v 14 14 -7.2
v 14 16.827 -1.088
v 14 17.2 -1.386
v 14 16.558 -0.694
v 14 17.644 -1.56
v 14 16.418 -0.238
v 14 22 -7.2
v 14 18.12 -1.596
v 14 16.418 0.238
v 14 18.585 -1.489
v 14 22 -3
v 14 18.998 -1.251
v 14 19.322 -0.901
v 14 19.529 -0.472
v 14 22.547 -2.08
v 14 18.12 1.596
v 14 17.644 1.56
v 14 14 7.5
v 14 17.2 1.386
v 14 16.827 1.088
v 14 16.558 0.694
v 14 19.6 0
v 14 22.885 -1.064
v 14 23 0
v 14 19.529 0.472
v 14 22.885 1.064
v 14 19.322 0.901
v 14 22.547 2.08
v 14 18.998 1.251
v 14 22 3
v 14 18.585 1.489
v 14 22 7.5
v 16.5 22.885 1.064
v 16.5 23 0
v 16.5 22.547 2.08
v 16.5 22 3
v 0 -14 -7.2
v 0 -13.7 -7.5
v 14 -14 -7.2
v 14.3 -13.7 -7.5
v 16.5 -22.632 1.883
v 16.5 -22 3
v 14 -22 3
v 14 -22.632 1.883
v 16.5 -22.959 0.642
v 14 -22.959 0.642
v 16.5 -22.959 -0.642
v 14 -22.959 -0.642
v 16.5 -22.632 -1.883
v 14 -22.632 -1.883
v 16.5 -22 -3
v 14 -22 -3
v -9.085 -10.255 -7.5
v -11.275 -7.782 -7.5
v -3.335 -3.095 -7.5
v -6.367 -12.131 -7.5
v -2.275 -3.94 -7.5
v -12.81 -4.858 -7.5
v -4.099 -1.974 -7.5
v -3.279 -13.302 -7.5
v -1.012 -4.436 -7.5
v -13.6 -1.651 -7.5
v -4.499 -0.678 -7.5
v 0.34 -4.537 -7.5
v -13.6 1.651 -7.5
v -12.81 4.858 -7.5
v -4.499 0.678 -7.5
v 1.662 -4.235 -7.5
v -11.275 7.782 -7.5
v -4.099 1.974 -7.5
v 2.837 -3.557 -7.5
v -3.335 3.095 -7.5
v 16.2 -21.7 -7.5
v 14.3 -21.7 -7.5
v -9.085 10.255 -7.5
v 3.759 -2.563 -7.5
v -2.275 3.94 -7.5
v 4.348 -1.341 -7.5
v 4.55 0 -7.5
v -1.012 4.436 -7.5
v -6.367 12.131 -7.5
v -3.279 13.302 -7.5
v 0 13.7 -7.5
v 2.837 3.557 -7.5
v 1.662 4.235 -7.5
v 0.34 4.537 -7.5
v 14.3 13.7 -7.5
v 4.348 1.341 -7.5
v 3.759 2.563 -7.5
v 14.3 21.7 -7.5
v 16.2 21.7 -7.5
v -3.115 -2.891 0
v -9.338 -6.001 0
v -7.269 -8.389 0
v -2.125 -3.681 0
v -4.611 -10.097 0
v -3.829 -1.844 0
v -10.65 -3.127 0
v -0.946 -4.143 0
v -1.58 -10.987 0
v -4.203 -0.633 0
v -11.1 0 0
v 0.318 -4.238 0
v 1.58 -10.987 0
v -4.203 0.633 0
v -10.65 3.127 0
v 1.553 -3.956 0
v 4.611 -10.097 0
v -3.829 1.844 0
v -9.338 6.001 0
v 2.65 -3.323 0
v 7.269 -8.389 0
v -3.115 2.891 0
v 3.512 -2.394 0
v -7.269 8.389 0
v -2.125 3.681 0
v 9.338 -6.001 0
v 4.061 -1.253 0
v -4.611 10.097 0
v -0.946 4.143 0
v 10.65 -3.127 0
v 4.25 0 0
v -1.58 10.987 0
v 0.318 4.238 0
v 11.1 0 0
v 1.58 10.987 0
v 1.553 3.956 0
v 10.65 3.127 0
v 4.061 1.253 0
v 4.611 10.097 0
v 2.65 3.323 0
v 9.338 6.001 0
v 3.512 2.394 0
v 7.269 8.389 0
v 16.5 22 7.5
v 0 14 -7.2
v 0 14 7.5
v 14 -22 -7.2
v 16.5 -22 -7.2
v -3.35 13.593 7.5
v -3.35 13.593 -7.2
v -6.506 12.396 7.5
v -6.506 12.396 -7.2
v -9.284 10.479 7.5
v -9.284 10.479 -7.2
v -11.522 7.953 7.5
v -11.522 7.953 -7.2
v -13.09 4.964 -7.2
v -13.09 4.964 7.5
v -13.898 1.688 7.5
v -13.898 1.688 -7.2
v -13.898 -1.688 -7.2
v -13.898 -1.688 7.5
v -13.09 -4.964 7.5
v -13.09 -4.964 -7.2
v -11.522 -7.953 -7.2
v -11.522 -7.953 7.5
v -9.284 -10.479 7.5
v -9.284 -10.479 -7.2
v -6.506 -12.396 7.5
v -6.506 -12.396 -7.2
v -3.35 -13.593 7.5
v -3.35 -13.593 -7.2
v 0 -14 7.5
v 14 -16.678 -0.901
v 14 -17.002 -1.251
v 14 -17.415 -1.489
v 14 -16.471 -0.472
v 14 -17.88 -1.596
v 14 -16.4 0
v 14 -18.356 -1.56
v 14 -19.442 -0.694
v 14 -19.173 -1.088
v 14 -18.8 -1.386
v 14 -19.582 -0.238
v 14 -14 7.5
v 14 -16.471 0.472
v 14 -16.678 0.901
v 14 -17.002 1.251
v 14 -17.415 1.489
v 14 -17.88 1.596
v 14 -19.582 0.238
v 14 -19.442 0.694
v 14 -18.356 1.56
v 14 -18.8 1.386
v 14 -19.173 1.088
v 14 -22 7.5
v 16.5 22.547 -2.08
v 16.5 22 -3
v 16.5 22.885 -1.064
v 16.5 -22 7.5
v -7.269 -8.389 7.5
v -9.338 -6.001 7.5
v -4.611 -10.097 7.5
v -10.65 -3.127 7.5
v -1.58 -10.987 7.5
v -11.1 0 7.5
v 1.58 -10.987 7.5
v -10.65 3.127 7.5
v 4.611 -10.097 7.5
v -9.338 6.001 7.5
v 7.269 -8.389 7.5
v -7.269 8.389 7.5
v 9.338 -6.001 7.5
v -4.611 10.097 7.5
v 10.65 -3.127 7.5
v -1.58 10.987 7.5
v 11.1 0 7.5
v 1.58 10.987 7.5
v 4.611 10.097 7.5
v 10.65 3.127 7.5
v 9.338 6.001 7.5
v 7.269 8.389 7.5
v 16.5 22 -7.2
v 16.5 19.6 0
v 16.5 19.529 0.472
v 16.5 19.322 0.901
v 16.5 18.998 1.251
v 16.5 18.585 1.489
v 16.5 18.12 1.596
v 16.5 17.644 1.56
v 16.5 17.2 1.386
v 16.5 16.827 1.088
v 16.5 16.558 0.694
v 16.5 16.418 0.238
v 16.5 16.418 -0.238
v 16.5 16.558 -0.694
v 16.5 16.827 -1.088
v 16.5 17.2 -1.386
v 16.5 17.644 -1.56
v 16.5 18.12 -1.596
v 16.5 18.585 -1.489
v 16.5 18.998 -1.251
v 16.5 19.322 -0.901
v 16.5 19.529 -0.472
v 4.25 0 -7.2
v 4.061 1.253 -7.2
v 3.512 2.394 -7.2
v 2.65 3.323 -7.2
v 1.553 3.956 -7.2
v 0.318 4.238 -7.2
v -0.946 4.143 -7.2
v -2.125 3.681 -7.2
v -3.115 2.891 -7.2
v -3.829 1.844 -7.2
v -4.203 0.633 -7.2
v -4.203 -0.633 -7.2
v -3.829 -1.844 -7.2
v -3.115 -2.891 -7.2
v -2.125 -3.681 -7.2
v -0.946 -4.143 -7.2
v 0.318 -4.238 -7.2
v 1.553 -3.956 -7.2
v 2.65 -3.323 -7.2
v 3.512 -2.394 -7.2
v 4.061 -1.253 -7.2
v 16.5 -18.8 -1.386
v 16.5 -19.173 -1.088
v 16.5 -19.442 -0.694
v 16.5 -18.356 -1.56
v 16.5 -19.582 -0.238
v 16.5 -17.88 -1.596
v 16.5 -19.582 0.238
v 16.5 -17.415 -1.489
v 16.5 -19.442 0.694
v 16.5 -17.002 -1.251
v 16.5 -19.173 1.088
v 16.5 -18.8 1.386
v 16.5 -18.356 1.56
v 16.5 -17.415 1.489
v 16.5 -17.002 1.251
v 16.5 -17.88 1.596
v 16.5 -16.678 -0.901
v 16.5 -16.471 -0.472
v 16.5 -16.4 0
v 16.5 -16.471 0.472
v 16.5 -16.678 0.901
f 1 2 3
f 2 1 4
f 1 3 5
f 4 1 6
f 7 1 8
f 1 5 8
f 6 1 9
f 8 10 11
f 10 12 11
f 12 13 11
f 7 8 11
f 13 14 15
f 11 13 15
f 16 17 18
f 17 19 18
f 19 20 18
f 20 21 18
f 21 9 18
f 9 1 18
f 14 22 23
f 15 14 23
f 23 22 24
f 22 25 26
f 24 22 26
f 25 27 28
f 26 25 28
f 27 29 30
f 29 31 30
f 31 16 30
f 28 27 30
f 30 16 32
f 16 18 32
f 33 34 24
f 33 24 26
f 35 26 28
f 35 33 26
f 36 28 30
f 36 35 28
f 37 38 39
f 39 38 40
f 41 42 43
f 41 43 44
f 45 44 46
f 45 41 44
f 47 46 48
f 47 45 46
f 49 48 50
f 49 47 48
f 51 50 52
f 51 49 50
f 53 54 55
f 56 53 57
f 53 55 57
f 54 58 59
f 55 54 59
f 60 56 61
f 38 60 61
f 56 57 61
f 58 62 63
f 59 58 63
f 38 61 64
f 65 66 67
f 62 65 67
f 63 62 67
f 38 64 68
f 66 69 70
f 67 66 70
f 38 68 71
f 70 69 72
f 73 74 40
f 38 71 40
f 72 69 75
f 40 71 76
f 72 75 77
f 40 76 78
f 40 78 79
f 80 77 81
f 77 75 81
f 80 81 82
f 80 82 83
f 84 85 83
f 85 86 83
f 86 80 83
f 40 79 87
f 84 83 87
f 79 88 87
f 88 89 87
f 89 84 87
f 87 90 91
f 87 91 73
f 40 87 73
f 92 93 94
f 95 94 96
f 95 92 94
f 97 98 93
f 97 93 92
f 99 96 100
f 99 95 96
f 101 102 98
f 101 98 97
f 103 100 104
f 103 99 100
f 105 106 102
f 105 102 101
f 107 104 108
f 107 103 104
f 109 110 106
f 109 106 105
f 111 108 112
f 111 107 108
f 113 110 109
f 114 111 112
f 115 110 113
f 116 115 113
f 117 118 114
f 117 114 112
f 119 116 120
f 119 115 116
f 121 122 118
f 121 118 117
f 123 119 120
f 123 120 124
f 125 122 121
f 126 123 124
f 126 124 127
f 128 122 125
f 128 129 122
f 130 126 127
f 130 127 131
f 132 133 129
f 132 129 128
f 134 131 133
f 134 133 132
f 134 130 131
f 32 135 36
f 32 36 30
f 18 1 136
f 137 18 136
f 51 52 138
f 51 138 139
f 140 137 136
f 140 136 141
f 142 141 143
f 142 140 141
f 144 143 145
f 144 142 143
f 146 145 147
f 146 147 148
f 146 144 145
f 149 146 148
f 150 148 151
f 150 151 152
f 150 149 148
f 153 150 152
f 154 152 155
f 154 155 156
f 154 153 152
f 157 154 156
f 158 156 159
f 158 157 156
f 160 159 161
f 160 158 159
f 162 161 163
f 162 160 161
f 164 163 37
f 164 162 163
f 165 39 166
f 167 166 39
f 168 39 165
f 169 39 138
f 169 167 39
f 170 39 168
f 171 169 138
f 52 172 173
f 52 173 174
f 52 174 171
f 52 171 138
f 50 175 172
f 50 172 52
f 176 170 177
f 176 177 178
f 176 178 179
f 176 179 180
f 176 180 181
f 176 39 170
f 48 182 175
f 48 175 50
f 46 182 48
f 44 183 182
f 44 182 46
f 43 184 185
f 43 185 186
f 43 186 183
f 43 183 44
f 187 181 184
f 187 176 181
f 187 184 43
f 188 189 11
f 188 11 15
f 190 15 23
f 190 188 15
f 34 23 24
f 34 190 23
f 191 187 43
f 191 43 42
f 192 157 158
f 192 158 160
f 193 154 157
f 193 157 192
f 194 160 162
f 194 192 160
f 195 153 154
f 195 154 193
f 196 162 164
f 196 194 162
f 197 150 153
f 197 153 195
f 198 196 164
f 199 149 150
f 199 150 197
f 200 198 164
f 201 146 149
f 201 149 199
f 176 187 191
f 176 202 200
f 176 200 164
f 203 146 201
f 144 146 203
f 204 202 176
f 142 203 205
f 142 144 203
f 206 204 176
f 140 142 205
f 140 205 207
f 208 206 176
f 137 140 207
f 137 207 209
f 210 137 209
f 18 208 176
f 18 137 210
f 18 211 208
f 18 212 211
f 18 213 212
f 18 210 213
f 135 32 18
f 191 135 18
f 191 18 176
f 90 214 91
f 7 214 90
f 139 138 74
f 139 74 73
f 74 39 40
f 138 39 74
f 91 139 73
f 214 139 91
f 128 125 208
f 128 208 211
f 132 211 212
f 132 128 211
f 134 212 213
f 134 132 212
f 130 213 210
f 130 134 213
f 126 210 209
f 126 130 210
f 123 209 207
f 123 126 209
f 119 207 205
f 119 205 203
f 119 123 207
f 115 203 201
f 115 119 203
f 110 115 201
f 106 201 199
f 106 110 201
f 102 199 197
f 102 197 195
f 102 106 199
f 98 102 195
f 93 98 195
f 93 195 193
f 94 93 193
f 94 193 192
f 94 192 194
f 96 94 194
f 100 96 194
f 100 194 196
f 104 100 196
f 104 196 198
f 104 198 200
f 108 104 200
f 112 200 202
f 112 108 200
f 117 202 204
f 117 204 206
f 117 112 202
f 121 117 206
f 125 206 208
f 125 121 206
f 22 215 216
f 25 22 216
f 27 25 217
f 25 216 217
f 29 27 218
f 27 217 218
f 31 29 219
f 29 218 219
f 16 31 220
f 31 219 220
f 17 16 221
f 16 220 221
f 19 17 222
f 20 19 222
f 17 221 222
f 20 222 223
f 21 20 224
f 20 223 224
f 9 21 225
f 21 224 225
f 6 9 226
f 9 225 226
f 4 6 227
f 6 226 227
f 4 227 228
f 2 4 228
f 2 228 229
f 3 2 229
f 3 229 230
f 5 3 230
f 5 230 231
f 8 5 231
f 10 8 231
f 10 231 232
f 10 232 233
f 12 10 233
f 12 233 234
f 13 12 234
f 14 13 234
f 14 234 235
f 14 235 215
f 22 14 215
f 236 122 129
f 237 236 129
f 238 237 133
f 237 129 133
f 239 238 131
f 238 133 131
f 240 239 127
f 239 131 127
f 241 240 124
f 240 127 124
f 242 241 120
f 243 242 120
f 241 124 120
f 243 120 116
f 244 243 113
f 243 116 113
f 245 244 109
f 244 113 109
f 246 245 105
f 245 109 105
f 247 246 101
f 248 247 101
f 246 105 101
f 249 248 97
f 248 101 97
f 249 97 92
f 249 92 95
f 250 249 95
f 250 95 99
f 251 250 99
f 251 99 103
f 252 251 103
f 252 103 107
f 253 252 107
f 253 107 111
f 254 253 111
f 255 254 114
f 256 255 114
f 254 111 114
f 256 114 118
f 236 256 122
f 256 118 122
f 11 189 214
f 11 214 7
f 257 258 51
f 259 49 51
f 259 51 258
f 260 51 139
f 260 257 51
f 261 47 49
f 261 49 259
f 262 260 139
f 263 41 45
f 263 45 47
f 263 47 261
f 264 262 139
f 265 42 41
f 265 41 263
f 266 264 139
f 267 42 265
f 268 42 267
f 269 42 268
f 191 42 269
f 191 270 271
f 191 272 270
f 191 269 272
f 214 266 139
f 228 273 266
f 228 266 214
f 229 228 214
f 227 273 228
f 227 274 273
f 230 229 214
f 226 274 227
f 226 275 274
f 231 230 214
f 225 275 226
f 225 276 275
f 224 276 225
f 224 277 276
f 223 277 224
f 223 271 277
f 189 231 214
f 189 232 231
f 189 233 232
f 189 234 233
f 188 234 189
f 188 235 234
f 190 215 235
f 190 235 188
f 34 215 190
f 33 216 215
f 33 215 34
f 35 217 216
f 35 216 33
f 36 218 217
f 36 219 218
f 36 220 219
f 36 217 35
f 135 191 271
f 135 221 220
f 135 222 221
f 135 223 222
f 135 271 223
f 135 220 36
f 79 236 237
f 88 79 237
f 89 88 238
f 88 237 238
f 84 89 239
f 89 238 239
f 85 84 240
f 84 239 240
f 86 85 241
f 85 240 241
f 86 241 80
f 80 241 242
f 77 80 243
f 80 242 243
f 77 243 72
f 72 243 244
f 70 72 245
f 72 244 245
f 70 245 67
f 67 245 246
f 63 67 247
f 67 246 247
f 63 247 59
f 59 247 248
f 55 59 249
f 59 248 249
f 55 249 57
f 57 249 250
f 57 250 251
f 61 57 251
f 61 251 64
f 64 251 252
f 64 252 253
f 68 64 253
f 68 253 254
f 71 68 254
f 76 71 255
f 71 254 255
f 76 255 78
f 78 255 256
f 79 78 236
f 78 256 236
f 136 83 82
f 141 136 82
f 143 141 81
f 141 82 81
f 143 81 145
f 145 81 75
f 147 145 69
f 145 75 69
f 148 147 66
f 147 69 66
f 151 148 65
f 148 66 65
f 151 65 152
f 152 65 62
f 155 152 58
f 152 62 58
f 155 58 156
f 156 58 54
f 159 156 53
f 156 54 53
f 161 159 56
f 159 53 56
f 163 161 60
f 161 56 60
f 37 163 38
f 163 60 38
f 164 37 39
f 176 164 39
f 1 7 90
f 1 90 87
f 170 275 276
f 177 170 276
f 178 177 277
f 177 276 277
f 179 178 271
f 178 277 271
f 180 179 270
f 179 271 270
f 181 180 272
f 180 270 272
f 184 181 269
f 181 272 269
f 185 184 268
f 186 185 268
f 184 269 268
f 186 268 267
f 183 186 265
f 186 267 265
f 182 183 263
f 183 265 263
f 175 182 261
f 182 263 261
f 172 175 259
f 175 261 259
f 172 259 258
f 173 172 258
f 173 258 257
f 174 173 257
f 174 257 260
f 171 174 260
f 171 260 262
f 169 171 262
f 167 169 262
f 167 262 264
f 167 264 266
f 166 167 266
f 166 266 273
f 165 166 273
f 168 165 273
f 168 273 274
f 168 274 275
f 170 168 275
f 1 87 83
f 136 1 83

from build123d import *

# Parameters (mm, degrees)
F0_R     = 11.1
F1_DEPTH = 7.5
F0_R_2   = 4.25
F2_DEPTH = 7.5
F3_R     = 1.6
F4_DEPTH = 30.501
F5_SIZE  = 0.3
F6_DEPTH = 2.5


with BuildPart() as f1:
    # F0 (on Top) → F1 (new body)
    with BuildSketch(Plane.XY):
        with BuildLine():
            ThreePointArc((0, -14), (9.8994949366, -9.8994949366), (14, 0))
            ThreePointArc((14, 0), (9.8994949366, 9.8994949366), (0, 14))
            ThreePointArc((0, 14), (-14, 0), (0, -14))
        make_face()
        Circle(F0_R, mode=Mode.SUBTRACT)
        with BuildLine():
            ThreePointArc((0, 14), (9.8994949366, 9.8994949366), (14, 0))
            ThreePointArc((14, 0), (9.8994949366, -9.8994949366), (0, -14))
            Line((0, -14), (14, -14))
            Line((14, -14), (14, -22))
            Line((14, -22), (16.5, -22))
            Line((16.5, -22), (16.5, 0))
            Line((16.5, 0), (16.5, 22))
            Line((16.5, 22), (14, 22))
            Line((14, 22), (14, 14))
            Line((14, 14), (0, 14))
        make_face()
    extrude(amount=F1_DEPTH)

    # F0 (on Top) → F2 (join)
    with BuildSketch(Plane.XY):
        with BuildLine():
            ThreePointArc((0, 14), (9.8994949366, 9.8994949366), (14, 0))
            ThreePointArc((14, 0), (9.8994949366, -9.8994949366), (0, -14))
            Line((0, -14), (14, -14))
            Line((14, -14), (14, -22))
            Line((14, -22), (16.5, -22))
            Line((16.5, -22), (16.5, 0))
            Line((16.5, 0), (16.5, 22))
            Line((16.5, 22), (14, 22))
            Line((14, 22), (14, 14))
            Line((14, 14), (0, 14))
        make_face()
        with BuildLine():
            ThreePointArc((0, -14), (9.8994949366, -9.8994949366), (14, 0))
            ThreePointArc((14, 0), (9.8994949366, 9.8994949366), (0, 14))
            ThreePointArc((0, 14), (-14, 0), (0, -14))
        make_face()
        Circle(F0_R, mode=Mode.SUBTRACT)
        Circle(F0_R)
        Circle(F0_R_2, mode=Mode.SUBTRACT)
    extrude(amount=-F2_DEPTH)

    # F3 (on face) → F4 (cut, through all)
    with BuildSketch(Plane.YZ.offset(16.5)):
        with Locations((18, 0)):
            Circle(F3_R)
        with Locations((-18, 0)):
            Circle(F3_R)
    extrude(amount=-F4_DEPTH, mode=Mode.SUBTRACT)

    # F5
    f5_edges = [f1.edges().sort_by_distance(p)[0] for p in [
        (7, -14, -7.5),
        (14, -18, -7.5),
        (15.25, -22, -7.5),
        (16.5, 0, -7.5),
        (15.25, 22, -7.5),
        (14, 18, -7.5),
        (7, 14, -7.5),
        (-14, 0, -7.5),
        (-4.25, 0, -7.5),
    ]]
    chamfer(f5_edges, length=F5_SIZE)

    # F3 (on face) → F6 (join, through all)
    with BuildSketch(Plane.YZ.offset(16.5)):
        with BuildLine():
            ThreePointArc((22, -3), (22.7434164903, -1.5811388301), (23, 0))
            ThreePointArc((23, 0), (22.7434164903, 1.5811388301), (22, 3))
            Line((22, 3), (22, -3))
        make_face()
        with BuildLine():
            Line((22, -3), (22, 3))
            ThreePointArc((22, 3), (13, 0), (22, -3))
        make_face()
        with Locations((18, 0)):
            Circle(F3_R, mode=Mode.SUBTRACT)
        with BuildLine():
            Line((-22, -3), (-22, 3))
            ThreePointArc((-22, 3), (-23, 0), (-22, -3))
        make_face()
    extrude(amount=-F6_DEPTH)


solid = f1.part
